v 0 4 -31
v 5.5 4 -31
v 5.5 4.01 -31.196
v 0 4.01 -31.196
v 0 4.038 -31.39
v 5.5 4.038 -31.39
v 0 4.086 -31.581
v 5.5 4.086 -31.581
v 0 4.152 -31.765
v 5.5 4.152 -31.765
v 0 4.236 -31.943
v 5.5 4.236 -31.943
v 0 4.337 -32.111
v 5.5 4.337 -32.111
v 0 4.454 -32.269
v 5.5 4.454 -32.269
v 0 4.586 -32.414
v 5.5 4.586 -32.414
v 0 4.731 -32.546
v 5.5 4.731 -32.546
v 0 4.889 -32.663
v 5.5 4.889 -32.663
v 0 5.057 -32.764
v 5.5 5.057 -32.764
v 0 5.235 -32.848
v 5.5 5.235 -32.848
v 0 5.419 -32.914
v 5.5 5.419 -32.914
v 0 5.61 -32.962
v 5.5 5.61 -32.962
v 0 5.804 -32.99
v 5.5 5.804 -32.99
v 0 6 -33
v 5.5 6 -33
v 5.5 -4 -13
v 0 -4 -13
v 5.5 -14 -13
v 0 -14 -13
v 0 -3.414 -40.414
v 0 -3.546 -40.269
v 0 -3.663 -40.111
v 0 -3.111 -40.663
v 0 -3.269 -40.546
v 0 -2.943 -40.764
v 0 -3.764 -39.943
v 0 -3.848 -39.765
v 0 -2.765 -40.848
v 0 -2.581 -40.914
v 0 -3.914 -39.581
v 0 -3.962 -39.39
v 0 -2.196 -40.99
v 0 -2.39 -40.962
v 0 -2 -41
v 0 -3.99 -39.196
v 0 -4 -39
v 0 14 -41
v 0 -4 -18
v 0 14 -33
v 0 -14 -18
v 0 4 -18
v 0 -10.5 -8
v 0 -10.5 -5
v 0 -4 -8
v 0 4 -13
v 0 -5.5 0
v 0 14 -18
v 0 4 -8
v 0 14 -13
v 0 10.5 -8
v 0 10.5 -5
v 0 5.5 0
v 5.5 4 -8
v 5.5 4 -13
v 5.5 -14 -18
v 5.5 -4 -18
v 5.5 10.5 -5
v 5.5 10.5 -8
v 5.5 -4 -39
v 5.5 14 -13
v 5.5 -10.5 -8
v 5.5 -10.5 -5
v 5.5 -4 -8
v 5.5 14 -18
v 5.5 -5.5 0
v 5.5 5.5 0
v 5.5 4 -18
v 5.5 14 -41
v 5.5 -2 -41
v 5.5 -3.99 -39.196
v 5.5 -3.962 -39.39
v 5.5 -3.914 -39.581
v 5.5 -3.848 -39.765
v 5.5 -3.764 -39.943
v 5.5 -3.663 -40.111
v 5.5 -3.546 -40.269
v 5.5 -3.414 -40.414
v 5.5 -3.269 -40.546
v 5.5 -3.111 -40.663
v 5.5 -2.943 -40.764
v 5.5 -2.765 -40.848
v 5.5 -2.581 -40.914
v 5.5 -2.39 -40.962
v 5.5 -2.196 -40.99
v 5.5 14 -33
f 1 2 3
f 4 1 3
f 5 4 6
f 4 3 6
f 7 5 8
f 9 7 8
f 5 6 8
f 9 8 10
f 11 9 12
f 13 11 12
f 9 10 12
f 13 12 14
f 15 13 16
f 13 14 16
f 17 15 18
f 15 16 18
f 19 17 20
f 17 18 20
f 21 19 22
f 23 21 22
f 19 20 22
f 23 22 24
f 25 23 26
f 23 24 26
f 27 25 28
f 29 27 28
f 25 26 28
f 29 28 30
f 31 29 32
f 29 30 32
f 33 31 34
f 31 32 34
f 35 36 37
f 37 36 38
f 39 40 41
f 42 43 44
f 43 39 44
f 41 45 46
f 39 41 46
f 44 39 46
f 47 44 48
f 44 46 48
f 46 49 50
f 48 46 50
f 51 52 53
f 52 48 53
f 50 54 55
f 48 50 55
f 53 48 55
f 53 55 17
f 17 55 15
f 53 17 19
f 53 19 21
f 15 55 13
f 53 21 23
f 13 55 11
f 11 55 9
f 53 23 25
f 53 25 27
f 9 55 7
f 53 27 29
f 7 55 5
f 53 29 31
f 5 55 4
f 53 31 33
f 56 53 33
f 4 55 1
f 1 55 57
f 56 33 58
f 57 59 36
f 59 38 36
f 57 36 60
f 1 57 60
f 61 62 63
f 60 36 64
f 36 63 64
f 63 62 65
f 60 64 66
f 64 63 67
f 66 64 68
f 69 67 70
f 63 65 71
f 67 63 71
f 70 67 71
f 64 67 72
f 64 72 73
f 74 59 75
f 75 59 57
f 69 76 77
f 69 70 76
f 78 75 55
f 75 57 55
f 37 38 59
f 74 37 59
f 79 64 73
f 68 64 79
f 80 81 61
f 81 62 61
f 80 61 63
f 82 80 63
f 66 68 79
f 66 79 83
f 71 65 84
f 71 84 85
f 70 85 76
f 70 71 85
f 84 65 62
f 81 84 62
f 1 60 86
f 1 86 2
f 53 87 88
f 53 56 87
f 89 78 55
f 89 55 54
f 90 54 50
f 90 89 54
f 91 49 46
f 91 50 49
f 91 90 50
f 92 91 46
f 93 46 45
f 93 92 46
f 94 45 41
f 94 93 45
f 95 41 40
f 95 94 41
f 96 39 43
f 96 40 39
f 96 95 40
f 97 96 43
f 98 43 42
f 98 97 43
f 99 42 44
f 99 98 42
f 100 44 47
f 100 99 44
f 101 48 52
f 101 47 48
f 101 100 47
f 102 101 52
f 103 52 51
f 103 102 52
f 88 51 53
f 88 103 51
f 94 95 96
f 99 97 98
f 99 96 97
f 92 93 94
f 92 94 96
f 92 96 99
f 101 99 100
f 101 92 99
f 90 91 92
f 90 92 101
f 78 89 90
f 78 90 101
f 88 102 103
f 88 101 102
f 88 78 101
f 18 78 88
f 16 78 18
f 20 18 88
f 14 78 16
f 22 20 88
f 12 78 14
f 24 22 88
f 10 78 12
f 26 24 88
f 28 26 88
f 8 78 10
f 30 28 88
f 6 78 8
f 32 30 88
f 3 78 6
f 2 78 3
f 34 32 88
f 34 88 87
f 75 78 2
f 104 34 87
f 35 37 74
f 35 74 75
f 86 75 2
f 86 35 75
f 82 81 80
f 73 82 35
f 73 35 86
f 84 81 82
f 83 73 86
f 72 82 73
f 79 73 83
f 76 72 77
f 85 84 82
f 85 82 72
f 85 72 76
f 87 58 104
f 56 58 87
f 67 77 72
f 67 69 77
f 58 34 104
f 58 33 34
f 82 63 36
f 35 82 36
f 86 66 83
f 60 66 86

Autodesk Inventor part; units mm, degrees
ref_plane "YZ Plane" through (0, 0, 0) normal (1, 0, 0) x (0, 1, 0)
ref_plane "XZ Plane" through (0, 0, 0) normal (0, 1, 0) x (-1, 0, 0)
ref_plane "XY Plane" through (0, 0, 0) normal (0, 0, 1) x (1, 0, 0)
sketch "Esquisse1" plane through (0, 0, 0) normal (1, 0, 0) x (0, 1, 0)
  line L0 (-5.5, 0) -> (5.5, 0)
  line L1 (10.5, -8) -> (4, -8)
  line L2 (4, -8) -> (4, -13)
  line L3 (4, -13) -> (14, -13)
  line L4 (14, -13) -> (14, -18)
  line L5 (14, -18) -> (4, -18)
  line L6 (-10.5, -8) -> (-4, -8)
  line L7 (-4, -8) -> (-4, -13)
  line L8 (-4, -13) -> (-14, -13)
  line L9 (-14, -13) -> (-14, -18)
  line L10 (-14, -18) -> (-4, -18)
  line L11 (4, -18) -> (4, -33)
  line L12 (-4, -18) -> (-4, -41)
  line L13 (5.5, 0) -> (10.5, -5)
  line L14 (10.5, -5) -> (10.5, -8)
  line L15 (-5.5, 0) -> (-10.5, -5)
  line L16 (-10.5, -5) -> (-10.5, -8)
  line L17 (14, -33) -> (14, -41)
  line L18 (4, -33) -> (14, -33)
  line L19 (14, -41) -> (-4, -41)
  point P0 (0, 0)
  point P1 (0, 0)
  dimension "d0" = 8
  dimension "d1" = 8
  dimension "d2" = 3
  dimension "d3" = 10
  dimension "d6" = 5
  dimension "d7" = 5
  dimension "d10" = 21
  dimension "d11" = 45
  dimension "d14" = 10
  dimension "d15" = 8
  dimension "d16" = 15
  dimension "d17" = 28
  dimension "d18" = 28
extrude "Extrusion1" add sketch "Esquisse1" along normal blind 5.5
fillet "Congé1" radius 2 2 edges at (2.75, -4, -41) (2.75, 4, -33)
properties part number "cable holder"
